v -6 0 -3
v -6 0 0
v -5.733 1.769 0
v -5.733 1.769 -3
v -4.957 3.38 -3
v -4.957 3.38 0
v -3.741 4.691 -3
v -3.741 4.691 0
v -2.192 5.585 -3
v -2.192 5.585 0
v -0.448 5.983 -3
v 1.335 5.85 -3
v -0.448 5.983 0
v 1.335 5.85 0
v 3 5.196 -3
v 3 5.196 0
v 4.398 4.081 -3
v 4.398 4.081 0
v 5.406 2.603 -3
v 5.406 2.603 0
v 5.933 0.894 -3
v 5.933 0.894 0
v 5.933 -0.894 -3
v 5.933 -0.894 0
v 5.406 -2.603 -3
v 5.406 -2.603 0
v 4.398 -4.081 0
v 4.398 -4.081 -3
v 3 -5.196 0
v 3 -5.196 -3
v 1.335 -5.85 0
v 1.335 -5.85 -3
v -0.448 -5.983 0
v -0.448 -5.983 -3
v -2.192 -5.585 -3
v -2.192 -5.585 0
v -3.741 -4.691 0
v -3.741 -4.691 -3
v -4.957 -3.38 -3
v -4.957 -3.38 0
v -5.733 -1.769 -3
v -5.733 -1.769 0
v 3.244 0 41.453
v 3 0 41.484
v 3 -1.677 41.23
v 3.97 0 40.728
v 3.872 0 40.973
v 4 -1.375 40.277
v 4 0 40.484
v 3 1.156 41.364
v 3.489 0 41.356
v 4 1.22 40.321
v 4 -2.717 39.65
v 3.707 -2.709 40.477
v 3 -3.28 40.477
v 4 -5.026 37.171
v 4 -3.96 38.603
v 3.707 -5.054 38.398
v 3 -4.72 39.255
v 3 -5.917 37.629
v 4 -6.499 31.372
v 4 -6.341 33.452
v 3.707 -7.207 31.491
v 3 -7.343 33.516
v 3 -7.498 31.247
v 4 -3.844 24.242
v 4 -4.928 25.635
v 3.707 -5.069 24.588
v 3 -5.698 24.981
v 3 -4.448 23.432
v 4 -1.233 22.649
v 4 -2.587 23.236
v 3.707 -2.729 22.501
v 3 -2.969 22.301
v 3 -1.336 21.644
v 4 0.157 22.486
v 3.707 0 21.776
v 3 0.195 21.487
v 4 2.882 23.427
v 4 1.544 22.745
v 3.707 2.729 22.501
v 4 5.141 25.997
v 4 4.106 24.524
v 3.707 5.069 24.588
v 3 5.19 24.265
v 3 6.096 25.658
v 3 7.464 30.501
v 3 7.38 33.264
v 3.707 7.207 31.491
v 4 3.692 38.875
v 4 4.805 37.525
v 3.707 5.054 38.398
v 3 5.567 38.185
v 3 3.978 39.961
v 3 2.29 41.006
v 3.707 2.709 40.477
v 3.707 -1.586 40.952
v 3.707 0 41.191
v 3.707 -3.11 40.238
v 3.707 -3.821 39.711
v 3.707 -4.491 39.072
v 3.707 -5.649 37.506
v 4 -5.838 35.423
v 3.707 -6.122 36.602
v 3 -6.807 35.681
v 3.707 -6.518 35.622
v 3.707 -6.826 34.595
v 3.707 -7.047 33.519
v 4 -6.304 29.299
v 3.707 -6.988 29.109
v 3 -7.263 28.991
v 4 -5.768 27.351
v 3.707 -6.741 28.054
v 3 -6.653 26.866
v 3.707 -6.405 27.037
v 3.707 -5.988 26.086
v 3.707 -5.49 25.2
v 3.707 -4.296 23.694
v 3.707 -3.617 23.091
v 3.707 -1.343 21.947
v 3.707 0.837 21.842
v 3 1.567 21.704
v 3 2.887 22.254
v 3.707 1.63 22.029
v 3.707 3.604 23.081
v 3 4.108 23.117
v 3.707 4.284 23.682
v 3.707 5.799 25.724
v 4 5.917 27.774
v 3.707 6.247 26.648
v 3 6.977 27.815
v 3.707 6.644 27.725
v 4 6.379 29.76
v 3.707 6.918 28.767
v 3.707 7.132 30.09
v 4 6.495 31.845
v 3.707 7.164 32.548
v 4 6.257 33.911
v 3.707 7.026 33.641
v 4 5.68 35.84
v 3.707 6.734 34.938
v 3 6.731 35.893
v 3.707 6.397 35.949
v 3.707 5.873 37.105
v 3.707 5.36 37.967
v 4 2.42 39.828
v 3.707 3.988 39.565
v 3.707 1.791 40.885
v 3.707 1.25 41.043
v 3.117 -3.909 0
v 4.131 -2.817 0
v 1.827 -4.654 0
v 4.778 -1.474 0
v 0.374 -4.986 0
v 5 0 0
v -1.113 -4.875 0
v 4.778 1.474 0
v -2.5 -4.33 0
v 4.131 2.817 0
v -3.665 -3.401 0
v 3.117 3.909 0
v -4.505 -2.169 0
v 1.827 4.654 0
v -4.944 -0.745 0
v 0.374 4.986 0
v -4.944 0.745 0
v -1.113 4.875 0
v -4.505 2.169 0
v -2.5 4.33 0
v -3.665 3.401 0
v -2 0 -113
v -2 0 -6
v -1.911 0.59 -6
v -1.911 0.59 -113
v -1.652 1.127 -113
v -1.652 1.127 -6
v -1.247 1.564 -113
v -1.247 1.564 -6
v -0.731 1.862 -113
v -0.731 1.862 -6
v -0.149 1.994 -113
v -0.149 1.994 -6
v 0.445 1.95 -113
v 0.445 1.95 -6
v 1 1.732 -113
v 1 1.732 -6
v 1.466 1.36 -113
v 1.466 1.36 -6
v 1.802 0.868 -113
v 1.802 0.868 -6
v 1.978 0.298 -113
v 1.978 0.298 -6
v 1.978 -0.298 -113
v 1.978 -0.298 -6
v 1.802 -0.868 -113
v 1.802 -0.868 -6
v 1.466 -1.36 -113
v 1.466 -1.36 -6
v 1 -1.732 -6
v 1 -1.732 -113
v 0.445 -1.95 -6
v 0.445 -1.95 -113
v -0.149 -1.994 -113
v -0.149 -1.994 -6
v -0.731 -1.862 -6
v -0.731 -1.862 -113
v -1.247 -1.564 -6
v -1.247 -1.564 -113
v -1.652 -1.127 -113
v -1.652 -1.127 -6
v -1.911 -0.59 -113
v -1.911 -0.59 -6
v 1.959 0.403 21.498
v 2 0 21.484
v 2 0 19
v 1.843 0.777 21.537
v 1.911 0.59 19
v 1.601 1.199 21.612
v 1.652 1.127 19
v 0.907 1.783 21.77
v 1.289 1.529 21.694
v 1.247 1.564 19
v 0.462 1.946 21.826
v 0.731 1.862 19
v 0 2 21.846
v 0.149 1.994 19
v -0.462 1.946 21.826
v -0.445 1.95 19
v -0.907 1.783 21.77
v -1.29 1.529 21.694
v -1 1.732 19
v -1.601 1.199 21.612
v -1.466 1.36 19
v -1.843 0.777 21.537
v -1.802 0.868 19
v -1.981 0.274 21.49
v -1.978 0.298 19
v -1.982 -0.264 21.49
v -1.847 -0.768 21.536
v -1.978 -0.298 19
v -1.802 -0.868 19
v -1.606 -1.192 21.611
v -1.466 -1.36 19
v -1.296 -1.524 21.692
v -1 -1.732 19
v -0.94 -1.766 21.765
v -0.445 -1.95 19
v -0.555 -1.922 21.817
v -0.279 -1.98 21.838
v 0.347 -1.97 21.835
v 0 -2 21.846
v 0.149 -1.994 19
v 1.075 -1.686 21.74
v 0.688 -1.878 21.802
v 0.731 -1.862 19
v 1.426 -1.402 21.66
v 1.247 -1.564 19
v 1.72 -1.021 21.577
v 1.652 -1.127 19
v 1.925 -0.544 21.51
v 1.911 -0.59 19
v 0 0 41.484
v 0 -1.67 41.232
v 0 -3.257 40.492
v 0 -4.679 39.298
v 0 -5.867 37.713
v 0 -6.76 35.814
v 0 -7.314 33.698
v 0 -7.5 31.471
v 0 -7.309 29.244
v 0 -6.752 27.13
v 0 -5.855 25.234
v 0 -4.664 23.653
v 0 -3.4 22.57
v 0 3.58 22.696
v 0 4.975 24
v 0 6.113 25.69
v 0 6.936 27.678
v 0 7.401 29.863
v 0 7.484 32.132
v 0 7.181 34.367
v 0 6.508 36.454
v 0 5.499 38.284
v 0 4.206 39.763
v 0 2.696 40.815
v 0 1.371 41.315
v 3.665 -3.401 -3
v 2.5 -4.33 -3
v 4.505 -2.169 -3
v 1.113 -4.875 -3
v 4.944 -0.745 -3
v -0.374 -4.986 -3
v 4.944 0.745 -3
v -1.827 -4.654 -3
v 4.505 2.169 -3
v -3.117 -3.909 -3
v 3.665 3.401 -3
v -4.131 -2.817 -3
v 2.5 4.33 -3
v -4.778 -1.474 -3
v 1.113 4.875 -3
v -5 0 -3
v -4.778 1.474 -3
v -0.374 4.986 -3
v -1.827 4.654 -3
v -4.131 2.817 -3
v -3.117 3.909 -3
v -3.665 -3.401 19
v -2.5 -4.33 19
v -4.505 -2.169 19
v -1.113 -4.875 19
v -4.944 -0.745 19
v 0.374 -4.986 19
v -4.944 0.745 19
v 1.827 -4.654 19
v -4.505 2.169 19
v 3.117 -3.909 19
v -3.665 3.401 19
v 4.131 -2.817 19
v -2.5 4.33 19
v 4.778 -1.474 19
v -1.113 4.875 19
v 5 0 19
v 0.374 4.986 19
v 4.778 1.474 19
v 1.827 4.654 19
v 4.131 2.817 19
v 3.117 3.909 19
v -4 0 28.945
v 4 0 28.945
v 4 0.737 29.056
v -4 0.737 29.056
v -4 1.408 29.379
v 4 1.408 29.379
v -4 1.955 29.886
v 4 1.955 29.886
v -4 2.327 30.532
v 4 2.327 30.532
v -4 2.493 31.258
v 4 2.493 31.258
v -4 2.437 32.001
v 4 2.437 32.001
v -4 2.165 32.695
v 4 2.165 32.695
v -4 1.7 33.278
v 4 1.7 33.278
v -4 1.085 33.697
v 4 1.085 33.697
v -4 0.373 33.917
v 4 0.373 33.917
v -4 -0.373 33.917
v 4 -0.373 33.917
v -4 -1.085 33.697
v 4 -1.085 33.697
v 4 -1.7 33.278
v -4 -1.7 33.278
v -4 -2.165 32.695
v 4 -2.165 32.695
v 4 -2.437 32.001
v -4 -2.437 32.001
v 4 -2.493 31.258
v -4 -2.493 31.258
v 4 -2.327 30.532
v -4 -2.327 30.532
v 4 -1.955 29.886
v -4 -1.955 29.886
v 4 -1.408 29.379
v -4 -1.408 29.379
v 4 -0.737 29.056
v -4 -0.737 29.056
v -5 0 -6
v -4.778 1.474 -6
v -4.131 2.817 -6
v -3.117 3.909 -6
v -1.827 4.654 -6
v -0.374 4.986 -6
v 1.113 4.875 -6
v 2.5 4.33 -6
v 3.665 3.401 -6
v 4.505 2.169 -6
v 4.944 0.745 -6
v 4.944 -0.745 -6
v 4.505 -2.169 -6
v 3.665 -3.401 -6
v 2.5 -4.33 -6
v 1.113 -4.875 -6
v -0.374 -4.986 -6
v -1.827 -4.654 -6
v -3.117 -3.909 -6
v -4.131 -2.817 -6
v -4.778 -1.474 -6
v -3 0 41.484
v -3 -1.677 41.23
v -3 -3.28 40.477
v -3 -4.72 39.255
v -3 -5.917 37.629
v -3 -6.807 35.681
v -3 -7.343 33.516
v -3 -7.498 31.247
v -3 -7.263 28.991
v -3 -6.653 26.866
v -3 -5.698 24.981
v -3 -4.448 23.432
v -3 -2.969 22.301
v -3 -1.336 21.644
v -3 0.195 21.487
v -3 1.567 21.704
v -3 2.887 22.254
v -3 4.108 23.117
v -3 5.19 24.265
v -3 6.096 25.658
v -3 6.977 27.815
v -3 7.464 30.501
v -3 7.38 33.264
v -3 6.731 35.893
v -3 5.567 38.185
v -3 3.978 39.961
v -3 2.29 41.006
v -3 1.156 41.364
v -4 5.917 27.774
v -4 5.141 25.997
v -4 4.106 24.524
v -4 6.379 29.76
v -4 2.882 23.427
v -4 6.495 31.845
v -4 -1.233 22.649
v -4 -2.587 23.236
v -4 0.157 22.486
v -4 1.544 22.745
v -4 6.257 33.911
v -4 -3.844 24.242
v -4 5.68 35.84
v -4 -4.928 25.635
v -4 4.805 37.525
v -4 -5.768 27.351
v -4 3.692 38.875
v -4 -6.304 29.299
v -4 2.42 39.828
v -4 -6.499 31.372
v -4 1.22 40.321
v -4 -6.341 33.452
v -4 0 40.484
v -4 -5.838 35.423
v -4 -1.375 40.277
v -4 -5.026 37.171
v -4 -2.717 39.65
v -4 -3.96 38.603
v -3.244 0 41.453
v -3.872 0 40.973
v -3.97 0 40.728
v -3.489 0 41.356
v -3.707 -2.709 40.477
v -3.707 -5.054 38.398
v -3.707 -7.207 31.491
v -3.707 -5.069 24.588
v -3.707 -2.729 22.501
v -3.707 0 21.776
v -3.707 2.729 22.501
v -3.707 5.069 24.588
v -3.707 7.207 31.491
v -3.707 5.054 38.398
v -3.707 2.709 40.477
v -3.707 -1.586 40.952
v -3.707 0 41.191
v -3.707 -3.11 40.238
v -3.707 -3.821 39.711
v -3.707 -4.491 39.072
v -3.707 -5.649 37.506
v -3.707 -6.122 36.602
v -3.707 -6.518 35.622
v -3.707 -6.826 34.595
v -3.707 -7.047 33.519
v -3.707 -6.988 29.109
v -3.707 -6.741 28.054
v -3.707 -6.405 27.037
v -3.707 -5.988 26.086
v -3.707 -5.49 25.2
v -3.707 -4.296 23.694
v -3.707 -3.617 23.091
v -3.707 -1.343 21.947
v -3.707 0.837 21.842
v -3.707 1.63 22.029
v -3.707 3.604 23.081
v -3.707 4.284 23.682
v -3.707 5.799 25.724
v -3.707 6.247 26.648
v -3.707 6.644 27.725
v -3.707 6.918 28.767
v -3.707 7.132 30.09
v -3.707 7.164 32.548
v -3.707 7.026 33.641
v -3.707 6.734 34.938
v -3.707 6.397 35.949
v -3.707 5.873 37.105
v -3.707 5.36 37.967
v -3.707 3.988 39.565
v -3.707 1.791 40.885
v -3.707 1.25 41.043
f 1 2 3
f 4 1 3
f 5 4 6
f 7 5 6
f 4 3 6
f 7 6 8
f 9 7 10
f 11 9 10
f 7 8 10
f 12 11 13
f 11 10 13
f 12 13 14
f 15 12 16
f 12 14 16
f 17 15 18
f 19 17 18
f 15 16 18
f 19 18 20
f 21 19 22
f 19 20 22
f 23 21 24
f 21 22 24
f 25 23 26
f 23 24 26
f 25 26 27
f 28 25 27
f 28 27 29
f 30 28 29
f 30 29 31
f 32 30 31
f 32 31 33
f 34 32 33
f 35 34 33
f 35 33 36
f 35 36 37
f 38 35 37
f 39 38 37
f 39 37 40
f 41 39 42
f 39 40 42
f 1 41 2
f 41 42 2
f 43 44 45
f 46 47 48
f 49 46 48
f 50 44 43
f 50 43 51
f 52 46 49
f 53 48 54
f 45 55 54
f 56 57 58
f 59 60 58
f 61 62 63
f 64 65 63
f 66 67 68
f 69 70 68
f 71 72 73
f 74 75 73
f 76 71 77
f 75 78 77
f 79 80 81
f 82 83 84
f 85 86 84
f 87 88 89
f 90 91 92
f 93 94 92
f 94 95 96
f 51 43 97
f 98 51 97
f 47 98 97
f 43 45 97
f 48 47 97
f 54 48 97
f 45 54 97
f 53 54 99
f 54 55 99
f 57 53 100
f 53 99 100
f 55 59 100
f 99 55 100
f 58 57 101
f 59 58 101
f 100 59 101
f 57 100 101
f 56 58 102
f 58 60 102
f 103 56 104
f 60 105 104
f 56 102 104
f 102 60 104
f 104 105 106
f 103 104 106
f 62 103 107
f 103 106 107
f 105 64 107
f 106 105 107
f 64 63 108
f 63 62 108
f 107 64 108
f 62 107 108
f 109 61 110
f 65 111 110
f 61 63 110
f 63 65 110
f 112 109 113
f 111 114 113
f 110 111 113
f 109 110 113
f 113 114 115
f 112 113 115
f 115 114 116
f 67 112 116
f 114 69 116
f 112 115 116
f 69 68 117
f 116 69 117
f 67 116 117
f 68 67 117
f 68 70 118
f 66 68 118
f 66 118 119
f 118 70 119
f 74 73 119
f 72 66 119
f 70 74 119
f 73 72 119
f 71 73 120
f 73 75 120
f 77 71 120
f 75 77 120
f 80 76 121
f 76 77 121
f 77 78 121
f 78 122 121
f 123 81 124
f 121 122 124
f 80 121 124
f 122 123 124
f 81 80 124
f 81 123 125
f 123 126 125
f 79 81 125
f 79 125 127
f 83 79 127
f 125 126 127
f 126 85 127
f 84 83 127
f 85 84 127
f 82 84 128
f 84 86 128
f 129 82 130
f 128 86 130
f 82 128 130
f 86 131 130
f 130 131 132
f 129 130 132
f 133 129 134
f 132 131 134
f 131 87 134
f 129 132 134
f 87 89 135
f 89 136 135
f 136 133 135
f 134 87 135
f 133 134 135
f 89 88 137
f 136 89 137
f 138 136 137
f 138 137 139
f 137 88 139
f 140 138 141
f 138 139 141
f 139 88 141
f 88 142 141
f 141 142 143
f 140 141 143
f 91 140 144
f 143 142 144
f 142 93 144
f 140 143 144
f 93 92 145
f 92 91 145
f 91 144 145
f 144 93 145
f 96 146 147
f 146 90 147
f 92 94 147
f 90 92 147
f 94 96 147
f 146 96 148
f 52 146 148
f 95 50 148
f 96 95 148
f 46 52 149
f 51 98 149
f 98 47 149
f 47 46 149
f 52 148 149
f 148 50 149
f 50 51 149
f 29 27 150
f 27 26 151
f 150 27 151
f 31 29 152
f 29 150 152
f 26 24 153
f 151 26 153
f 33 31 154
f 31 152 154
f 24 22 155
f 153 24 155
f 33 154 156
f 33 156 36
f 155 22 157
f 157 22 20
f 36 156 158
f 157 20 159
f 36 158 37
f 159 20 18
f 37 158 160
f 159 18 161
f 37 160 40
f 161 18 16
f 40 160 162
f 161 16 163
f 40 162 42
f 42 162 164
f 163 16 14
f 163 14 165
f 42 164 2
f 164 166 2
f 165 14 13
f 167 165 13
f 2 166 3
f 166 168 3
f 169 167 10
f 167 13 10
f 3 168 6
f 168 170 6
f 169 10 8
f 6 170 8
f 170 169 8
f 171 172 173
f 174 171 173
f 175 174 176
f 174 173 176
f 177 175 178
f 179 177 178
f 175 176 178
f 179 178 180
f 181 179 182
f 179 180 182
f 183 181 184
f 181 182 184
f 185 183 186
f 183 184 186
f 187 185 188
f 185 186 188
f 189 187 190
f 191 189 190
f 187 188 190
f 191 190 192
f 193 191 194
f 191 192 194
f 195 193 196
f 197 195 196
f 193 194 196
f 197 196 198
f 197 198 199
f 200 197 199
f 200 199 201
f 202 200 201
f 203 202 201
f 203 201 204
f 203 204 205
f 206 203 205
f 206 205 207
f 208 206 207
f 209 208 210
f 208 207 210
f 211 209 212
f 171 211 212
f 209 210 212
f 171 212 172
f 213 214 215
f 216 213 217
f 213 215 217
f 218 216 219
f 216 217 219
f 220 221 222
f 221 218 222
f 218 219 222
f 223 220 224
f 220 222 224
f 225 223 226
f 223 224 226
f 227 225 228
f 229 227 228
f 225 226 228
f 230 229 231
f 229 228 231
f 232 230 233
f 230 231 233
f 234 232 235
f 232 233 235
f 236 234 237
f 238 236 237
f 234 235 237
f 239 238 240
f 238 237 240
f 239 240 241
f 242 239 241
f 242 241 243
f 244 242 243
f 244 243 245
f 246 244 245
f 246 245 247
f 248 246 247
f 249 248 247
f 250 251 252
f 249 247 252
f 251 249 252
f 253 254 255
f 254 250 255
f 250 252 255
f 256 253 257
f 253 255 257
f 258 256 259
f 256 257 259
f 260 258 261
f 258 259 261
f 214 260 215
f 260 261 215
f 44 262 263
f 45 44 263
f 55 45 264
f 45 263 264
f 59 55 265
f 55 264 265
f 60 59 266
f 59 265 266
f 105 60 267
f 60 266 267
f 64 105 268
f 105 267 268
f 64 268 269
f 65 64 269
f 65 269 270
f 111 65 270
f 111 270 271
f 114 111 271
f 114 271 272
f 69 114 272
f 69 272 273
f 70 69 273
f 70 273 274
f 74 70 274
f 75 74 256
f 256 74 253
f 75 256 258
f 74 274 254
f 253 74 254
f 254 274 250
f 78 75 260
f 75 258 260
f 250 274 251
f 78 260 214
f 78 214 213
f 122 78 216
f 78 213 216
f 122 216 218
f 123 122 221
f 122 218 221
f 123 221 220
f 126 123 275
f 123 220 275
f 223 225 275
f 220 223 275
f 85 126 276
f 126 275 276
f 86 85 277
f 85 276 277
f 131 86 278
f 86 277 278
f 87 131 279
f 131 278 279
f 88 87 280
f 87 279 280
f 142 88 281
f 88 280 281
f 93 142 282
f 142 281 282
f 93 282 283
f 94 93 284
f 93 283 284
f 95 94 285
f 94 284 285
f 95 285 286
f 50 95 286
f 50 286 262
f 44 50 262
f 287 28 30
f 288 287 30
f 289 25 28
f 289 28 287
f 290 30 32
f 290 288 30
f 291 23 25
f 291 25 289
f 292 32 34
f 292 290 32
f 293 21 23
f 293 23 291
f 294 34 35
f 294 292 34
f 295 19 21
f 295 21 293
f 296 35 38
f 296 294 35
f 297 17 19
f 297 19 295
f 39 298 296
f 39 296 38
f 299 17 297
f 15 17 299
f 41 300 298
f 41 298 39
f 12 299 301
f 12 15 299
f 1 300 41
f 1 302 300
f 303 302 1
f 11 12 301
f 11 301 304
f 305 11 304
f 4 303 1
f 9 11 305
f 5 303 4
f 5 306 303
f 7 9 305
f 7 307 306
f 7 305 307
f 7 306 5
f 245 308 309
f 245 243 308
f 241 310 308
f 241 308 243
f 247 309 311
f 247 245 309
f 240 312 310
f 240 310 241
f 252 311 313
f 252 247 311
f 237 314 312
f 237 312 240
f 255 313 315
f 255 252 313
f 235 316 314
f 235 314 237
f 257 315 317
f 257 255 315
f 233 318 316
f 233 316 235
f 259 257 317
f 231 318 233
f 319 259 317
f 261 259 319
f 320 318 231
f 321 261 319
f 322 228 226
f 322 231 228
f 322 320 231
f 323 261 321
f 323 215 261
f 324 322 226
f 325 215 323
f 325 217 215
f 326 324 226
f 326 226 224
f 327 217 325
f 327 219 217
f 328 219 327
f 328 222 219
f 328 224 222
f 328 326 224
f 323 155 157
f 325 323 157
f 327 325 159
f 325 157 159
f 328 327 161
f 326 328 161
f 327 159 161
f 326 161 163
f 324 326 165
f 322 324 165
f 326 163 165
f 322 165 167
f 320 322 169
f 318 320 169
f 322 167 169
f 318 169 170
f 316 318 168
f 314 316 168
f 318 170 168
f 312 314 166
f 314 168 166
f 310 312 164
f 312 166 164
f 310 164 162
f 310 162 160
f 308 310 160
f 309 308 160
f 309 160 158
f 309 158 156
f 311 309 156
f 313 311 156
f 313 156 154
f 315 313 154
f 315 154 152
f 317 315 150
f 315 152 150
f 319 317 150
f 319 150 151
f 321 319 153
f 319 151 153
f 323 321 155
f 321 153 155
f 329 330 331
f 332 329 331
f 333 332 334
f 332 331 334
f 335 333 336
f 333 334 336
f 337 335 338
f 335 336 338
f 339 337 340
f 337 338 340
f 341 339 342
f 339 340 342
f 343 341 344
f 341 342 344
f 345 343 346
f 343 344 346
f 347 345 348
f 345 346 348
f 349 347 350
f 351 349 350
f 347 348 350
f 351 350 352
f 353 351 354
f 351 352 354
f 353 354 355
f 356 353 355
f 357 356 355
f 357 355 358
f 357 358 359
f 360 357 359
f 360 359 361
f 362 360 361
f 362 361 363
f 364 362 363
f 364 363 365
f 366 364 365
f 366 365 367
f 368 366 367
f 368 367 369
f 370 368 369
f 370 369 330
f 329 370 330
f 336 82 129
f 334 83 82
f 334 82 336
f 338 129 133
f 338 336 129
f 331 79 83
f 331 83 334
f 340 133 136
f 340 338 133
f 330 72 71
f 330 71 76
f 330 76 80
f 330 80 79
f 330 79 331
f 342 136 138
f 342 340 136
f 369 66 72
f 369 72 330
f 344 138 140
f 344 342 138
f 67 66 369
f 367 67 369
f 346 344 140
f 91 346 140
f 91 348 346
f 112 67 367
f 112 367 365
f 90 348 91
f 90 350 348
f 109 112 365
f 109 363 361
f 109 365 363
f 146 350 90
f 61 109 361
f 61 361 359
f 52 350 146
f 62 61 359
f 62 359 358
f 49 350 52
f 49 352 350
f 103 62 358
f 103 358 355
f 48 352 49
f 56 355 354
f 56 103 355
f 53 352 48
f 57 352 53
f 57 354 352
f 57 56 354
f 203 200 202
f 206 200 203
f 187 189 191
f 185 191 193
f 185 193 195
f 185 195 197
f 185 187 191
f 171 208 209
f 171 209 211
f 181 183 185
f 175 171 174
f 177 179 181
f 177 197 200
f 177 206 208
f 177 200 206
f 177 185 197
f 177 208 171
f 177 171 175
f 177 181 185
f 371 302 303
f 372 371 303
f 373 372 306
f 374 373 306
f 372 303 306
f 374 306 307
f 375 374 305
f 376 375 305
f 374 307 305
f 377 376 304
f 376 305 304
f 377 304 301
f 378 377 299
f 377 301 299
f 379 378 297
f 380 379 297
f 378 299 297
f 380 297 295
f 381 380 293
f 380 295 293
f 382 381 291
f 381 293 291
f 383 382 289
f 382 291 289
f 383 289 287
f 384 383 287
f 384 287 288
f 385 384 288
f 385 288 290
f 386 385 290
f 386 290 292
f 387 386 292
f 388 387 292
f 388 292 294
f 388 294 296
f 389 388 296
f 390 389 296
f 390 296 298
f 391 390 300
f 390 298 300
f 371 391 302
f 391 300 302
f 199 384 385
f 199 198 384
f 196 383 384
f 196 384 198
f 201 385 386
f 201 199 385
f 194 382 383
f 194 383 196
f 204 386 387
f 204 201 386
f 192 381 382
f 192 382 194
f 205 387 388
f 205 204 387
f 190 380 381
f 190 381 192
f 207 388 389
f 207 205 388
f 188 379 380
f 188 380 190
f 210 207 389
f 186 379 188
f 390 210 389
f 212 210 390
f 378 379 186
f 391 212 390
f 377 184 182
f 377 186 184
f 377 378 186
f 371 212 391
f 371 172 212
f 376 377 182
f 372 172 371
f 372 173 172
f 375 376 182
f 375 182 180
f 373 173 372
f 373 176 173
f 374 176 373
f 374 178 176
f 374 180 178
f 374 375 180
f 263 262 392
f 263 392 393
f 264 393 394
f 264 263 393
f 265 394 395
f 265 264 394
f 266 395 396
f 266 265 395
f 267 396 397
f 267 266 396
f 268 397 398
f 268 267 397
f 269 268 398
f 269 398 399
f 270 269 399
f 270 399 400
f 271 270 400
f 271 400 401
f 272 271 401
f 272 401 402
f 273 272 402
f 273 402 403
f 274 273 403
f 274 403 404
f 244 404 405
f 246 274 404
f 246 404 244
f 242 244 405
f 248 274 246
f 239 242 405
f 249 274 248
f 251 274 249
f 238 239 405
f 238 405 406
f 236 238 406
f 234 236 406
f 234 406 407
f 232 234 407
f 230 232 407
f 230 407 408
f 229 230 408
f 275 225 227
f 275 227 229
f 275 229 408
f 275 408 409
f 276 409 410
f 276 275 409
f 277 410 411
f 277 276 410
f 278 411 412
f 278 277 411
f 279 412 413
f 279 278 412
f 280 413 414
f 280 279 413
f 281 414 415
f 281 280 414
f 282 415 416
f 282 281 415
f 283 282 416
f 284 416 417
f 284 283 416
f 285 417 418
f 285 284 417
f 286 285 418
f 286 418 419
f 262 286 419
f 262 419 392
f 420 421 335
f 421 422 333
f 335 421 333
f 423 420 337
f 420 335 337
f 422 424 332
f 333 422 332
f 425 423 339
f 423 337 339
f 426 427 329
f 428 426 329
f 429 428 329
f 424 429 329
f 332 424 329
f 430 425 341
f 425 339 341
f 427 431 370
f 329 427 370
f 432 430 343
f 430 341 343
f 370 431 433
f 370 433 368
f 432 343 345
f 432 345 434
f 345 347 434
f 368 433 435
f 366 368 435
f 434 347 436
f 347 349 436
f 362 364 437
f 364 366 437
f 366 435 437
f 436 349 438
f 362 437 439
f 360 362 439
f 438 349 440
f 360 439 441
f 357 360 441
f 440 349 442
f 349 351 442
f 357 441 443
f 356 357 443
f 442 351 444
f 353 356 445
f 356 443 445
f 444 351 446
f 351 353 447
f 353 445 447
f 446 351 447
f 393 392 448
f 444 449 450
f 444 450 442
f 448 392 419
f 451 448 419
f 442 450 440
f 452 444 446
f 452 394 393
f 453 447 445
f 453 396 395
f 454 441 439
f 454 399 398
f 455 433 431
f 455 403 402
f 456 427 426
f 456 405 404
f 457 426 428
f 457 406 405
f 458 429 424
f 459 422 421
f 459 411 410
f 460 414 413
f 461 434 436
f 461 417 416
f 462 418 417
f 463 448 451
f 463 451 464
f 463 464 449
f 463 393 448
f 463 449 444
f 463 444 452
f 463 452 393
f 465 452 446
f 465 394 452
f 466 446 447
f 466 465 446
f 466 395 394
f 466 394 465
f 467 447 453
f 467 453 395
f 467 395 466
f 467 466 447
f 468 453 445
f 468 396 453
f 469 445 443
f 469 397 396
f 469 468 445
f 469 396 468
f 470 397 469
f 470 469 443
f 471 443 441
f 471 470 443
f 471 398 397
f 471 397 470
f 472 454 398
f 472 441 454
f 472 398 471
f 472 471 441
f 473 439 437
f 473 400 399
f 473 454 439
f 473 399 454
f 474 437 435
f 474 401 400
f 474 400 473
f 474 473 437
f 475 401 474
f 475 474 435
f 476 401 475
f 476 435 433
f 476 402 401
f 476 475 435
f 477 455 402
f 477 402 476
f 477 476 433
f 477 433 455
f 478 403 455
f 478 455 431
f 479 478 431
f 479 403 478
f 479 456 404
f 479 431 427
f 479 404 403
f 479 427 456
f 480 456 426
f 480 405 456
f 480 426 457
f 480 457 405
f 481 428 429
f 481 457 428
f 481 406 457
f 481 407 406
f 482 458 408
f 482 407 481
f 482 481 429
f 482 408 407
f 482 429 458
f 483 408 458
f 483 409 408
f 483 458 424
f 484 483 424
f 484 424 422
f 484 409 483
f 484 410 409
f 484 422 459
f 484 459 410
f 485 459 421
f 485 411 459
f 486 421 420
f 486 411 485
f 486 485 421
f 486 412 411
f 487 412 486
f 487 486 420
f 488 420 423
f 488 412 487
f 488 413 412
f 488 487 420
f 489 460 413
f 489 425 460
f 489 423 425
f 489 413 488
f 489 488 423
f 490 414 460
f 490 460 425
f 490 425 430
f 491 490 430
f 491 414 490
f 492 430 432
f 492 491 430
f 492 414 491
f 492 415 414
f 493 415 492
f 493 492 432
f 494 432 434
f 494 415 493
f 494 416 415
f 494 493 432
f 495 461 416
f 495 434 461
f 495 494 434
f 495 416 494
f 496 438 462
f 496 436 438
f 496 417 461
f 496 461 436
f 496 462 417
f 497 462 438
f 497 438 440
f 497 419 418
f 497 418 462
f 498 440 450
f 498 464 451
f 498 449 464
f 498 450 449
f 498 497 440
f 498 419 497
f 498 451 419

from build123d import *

# Parameters (mm, degrees)
SKETCH1_R           = 5
BOSS_EXTRUDE1_DEPTH = 19
SKETCH2_R           = 6
BOSS_EXTRUDE2_DEPTH = 3
SKETCH3_R           = 5
BOSS_EXTRUDE3_DEPTH = 3
SKETCH4_R           = 2
BOSS_EXTRUDE4_DEPTH = 107
SKETCH5_RX          = 10
SKETCH5_RY          = 7.5
BOSS_EXTRUDE5_DEPTH = 4
SKETCH6_R           = 2
BOSS_EXTRUDE6_DEPTH = 4
FILLET1_R           = 1
SKETCH7_R           = 2.5
CUT_EXTRUDE1_DEPTH  = 11


with BuildPart() as part:
    # Sketch1 → Boss-Extrude1 (new body)
    with BuildSketch(Plane.XY):
        Circle(SKETCH1_R)
    extrude(amount=BOSS_EXTRUDE1_DEPTH)

    # Sketch2 → Boss-Extrude2 (add)
    with BuildSketch(Plane(origin=(0, 0, 0), x_dir=(-1, 0, 0), z_dir=(0, 0, -1))):
        Circle(SKETCH2_R)
    extrude(amount=BOSS_EXTRUDE2_DEPTH)

    # Sketch3 → Boss-Extrude3 (add)
    with BuildSketch(Plane(origin=(0, 0, -3), x_dir=(-1, 0, 0), z_dir=(0, 0, -1))):
        Circle(SKETCH3_R)
    extrude(amount=BOSS_EXTRUDE3_DEPTH)

    # Sketch4 → Boss-Extrude4 (add)
    with BuildSketch(Plane(origin=(0, 0, -6), x_dir=(-1, 0, 0), z_dir=(0, 0, -1))):
        Circle(SKETCH4_R)
    extrude(amount=BOSS_EXTRUDE4_DEPTH)



with BuildPart() as body_2:
    # Sketch5 → Boss-Extrude5 (new body, symmetric)
    with BuildSketch(Plane(origin=(0, 0, 0), x_dir=(0, 0, -1), z_dir=(1, 0, 0))):
        with Locations(Location((-31.48355656, 0), (0, 0, 180))):
            Ellipse(SKETCH5_RX, SKETCH5_RY)
    extrude(amount=BOSS_EXTRUDE5_DEPTH, both=True)


with BuildPart() as part_1:
    add(part.part)

    add(body_2.part)  # Boss-Extrude6 merges body 2
    # Sketch6 → Boss-Extrude6 (add)
    with BuildSketch(Plane.XY.offset(19)):
        Circle(SKETCH6_R)
    extrude(amount=BOSS_EXTRUDE6_DEPTH)

    # Fillet1
    fillet1_edges = [part_1.edges().sort_by_distance(p)[0] for p in [
        (-4, 0.002625288, 21.483557173),
        (4, 0.002625288, 21.483557173),
    ]]
    fillet(fillet1_edges, radius=FILLET1_R)

    # Sketch7 → Cut-Extrude1 (cut, through all)
    with BuildSketch(Plane(origin=(4, 0, 0), x_dir=(0, 0, -1), z_dir=(1, 0, 0))):
        with Locations((-31.444890306, 0)):
            Circle(SKETCH7_R)
    extrude(amount=-CUT_EXTRUDE1_DEPTH, mode=Mode.SUBTRACT)


solid = part_1.part
